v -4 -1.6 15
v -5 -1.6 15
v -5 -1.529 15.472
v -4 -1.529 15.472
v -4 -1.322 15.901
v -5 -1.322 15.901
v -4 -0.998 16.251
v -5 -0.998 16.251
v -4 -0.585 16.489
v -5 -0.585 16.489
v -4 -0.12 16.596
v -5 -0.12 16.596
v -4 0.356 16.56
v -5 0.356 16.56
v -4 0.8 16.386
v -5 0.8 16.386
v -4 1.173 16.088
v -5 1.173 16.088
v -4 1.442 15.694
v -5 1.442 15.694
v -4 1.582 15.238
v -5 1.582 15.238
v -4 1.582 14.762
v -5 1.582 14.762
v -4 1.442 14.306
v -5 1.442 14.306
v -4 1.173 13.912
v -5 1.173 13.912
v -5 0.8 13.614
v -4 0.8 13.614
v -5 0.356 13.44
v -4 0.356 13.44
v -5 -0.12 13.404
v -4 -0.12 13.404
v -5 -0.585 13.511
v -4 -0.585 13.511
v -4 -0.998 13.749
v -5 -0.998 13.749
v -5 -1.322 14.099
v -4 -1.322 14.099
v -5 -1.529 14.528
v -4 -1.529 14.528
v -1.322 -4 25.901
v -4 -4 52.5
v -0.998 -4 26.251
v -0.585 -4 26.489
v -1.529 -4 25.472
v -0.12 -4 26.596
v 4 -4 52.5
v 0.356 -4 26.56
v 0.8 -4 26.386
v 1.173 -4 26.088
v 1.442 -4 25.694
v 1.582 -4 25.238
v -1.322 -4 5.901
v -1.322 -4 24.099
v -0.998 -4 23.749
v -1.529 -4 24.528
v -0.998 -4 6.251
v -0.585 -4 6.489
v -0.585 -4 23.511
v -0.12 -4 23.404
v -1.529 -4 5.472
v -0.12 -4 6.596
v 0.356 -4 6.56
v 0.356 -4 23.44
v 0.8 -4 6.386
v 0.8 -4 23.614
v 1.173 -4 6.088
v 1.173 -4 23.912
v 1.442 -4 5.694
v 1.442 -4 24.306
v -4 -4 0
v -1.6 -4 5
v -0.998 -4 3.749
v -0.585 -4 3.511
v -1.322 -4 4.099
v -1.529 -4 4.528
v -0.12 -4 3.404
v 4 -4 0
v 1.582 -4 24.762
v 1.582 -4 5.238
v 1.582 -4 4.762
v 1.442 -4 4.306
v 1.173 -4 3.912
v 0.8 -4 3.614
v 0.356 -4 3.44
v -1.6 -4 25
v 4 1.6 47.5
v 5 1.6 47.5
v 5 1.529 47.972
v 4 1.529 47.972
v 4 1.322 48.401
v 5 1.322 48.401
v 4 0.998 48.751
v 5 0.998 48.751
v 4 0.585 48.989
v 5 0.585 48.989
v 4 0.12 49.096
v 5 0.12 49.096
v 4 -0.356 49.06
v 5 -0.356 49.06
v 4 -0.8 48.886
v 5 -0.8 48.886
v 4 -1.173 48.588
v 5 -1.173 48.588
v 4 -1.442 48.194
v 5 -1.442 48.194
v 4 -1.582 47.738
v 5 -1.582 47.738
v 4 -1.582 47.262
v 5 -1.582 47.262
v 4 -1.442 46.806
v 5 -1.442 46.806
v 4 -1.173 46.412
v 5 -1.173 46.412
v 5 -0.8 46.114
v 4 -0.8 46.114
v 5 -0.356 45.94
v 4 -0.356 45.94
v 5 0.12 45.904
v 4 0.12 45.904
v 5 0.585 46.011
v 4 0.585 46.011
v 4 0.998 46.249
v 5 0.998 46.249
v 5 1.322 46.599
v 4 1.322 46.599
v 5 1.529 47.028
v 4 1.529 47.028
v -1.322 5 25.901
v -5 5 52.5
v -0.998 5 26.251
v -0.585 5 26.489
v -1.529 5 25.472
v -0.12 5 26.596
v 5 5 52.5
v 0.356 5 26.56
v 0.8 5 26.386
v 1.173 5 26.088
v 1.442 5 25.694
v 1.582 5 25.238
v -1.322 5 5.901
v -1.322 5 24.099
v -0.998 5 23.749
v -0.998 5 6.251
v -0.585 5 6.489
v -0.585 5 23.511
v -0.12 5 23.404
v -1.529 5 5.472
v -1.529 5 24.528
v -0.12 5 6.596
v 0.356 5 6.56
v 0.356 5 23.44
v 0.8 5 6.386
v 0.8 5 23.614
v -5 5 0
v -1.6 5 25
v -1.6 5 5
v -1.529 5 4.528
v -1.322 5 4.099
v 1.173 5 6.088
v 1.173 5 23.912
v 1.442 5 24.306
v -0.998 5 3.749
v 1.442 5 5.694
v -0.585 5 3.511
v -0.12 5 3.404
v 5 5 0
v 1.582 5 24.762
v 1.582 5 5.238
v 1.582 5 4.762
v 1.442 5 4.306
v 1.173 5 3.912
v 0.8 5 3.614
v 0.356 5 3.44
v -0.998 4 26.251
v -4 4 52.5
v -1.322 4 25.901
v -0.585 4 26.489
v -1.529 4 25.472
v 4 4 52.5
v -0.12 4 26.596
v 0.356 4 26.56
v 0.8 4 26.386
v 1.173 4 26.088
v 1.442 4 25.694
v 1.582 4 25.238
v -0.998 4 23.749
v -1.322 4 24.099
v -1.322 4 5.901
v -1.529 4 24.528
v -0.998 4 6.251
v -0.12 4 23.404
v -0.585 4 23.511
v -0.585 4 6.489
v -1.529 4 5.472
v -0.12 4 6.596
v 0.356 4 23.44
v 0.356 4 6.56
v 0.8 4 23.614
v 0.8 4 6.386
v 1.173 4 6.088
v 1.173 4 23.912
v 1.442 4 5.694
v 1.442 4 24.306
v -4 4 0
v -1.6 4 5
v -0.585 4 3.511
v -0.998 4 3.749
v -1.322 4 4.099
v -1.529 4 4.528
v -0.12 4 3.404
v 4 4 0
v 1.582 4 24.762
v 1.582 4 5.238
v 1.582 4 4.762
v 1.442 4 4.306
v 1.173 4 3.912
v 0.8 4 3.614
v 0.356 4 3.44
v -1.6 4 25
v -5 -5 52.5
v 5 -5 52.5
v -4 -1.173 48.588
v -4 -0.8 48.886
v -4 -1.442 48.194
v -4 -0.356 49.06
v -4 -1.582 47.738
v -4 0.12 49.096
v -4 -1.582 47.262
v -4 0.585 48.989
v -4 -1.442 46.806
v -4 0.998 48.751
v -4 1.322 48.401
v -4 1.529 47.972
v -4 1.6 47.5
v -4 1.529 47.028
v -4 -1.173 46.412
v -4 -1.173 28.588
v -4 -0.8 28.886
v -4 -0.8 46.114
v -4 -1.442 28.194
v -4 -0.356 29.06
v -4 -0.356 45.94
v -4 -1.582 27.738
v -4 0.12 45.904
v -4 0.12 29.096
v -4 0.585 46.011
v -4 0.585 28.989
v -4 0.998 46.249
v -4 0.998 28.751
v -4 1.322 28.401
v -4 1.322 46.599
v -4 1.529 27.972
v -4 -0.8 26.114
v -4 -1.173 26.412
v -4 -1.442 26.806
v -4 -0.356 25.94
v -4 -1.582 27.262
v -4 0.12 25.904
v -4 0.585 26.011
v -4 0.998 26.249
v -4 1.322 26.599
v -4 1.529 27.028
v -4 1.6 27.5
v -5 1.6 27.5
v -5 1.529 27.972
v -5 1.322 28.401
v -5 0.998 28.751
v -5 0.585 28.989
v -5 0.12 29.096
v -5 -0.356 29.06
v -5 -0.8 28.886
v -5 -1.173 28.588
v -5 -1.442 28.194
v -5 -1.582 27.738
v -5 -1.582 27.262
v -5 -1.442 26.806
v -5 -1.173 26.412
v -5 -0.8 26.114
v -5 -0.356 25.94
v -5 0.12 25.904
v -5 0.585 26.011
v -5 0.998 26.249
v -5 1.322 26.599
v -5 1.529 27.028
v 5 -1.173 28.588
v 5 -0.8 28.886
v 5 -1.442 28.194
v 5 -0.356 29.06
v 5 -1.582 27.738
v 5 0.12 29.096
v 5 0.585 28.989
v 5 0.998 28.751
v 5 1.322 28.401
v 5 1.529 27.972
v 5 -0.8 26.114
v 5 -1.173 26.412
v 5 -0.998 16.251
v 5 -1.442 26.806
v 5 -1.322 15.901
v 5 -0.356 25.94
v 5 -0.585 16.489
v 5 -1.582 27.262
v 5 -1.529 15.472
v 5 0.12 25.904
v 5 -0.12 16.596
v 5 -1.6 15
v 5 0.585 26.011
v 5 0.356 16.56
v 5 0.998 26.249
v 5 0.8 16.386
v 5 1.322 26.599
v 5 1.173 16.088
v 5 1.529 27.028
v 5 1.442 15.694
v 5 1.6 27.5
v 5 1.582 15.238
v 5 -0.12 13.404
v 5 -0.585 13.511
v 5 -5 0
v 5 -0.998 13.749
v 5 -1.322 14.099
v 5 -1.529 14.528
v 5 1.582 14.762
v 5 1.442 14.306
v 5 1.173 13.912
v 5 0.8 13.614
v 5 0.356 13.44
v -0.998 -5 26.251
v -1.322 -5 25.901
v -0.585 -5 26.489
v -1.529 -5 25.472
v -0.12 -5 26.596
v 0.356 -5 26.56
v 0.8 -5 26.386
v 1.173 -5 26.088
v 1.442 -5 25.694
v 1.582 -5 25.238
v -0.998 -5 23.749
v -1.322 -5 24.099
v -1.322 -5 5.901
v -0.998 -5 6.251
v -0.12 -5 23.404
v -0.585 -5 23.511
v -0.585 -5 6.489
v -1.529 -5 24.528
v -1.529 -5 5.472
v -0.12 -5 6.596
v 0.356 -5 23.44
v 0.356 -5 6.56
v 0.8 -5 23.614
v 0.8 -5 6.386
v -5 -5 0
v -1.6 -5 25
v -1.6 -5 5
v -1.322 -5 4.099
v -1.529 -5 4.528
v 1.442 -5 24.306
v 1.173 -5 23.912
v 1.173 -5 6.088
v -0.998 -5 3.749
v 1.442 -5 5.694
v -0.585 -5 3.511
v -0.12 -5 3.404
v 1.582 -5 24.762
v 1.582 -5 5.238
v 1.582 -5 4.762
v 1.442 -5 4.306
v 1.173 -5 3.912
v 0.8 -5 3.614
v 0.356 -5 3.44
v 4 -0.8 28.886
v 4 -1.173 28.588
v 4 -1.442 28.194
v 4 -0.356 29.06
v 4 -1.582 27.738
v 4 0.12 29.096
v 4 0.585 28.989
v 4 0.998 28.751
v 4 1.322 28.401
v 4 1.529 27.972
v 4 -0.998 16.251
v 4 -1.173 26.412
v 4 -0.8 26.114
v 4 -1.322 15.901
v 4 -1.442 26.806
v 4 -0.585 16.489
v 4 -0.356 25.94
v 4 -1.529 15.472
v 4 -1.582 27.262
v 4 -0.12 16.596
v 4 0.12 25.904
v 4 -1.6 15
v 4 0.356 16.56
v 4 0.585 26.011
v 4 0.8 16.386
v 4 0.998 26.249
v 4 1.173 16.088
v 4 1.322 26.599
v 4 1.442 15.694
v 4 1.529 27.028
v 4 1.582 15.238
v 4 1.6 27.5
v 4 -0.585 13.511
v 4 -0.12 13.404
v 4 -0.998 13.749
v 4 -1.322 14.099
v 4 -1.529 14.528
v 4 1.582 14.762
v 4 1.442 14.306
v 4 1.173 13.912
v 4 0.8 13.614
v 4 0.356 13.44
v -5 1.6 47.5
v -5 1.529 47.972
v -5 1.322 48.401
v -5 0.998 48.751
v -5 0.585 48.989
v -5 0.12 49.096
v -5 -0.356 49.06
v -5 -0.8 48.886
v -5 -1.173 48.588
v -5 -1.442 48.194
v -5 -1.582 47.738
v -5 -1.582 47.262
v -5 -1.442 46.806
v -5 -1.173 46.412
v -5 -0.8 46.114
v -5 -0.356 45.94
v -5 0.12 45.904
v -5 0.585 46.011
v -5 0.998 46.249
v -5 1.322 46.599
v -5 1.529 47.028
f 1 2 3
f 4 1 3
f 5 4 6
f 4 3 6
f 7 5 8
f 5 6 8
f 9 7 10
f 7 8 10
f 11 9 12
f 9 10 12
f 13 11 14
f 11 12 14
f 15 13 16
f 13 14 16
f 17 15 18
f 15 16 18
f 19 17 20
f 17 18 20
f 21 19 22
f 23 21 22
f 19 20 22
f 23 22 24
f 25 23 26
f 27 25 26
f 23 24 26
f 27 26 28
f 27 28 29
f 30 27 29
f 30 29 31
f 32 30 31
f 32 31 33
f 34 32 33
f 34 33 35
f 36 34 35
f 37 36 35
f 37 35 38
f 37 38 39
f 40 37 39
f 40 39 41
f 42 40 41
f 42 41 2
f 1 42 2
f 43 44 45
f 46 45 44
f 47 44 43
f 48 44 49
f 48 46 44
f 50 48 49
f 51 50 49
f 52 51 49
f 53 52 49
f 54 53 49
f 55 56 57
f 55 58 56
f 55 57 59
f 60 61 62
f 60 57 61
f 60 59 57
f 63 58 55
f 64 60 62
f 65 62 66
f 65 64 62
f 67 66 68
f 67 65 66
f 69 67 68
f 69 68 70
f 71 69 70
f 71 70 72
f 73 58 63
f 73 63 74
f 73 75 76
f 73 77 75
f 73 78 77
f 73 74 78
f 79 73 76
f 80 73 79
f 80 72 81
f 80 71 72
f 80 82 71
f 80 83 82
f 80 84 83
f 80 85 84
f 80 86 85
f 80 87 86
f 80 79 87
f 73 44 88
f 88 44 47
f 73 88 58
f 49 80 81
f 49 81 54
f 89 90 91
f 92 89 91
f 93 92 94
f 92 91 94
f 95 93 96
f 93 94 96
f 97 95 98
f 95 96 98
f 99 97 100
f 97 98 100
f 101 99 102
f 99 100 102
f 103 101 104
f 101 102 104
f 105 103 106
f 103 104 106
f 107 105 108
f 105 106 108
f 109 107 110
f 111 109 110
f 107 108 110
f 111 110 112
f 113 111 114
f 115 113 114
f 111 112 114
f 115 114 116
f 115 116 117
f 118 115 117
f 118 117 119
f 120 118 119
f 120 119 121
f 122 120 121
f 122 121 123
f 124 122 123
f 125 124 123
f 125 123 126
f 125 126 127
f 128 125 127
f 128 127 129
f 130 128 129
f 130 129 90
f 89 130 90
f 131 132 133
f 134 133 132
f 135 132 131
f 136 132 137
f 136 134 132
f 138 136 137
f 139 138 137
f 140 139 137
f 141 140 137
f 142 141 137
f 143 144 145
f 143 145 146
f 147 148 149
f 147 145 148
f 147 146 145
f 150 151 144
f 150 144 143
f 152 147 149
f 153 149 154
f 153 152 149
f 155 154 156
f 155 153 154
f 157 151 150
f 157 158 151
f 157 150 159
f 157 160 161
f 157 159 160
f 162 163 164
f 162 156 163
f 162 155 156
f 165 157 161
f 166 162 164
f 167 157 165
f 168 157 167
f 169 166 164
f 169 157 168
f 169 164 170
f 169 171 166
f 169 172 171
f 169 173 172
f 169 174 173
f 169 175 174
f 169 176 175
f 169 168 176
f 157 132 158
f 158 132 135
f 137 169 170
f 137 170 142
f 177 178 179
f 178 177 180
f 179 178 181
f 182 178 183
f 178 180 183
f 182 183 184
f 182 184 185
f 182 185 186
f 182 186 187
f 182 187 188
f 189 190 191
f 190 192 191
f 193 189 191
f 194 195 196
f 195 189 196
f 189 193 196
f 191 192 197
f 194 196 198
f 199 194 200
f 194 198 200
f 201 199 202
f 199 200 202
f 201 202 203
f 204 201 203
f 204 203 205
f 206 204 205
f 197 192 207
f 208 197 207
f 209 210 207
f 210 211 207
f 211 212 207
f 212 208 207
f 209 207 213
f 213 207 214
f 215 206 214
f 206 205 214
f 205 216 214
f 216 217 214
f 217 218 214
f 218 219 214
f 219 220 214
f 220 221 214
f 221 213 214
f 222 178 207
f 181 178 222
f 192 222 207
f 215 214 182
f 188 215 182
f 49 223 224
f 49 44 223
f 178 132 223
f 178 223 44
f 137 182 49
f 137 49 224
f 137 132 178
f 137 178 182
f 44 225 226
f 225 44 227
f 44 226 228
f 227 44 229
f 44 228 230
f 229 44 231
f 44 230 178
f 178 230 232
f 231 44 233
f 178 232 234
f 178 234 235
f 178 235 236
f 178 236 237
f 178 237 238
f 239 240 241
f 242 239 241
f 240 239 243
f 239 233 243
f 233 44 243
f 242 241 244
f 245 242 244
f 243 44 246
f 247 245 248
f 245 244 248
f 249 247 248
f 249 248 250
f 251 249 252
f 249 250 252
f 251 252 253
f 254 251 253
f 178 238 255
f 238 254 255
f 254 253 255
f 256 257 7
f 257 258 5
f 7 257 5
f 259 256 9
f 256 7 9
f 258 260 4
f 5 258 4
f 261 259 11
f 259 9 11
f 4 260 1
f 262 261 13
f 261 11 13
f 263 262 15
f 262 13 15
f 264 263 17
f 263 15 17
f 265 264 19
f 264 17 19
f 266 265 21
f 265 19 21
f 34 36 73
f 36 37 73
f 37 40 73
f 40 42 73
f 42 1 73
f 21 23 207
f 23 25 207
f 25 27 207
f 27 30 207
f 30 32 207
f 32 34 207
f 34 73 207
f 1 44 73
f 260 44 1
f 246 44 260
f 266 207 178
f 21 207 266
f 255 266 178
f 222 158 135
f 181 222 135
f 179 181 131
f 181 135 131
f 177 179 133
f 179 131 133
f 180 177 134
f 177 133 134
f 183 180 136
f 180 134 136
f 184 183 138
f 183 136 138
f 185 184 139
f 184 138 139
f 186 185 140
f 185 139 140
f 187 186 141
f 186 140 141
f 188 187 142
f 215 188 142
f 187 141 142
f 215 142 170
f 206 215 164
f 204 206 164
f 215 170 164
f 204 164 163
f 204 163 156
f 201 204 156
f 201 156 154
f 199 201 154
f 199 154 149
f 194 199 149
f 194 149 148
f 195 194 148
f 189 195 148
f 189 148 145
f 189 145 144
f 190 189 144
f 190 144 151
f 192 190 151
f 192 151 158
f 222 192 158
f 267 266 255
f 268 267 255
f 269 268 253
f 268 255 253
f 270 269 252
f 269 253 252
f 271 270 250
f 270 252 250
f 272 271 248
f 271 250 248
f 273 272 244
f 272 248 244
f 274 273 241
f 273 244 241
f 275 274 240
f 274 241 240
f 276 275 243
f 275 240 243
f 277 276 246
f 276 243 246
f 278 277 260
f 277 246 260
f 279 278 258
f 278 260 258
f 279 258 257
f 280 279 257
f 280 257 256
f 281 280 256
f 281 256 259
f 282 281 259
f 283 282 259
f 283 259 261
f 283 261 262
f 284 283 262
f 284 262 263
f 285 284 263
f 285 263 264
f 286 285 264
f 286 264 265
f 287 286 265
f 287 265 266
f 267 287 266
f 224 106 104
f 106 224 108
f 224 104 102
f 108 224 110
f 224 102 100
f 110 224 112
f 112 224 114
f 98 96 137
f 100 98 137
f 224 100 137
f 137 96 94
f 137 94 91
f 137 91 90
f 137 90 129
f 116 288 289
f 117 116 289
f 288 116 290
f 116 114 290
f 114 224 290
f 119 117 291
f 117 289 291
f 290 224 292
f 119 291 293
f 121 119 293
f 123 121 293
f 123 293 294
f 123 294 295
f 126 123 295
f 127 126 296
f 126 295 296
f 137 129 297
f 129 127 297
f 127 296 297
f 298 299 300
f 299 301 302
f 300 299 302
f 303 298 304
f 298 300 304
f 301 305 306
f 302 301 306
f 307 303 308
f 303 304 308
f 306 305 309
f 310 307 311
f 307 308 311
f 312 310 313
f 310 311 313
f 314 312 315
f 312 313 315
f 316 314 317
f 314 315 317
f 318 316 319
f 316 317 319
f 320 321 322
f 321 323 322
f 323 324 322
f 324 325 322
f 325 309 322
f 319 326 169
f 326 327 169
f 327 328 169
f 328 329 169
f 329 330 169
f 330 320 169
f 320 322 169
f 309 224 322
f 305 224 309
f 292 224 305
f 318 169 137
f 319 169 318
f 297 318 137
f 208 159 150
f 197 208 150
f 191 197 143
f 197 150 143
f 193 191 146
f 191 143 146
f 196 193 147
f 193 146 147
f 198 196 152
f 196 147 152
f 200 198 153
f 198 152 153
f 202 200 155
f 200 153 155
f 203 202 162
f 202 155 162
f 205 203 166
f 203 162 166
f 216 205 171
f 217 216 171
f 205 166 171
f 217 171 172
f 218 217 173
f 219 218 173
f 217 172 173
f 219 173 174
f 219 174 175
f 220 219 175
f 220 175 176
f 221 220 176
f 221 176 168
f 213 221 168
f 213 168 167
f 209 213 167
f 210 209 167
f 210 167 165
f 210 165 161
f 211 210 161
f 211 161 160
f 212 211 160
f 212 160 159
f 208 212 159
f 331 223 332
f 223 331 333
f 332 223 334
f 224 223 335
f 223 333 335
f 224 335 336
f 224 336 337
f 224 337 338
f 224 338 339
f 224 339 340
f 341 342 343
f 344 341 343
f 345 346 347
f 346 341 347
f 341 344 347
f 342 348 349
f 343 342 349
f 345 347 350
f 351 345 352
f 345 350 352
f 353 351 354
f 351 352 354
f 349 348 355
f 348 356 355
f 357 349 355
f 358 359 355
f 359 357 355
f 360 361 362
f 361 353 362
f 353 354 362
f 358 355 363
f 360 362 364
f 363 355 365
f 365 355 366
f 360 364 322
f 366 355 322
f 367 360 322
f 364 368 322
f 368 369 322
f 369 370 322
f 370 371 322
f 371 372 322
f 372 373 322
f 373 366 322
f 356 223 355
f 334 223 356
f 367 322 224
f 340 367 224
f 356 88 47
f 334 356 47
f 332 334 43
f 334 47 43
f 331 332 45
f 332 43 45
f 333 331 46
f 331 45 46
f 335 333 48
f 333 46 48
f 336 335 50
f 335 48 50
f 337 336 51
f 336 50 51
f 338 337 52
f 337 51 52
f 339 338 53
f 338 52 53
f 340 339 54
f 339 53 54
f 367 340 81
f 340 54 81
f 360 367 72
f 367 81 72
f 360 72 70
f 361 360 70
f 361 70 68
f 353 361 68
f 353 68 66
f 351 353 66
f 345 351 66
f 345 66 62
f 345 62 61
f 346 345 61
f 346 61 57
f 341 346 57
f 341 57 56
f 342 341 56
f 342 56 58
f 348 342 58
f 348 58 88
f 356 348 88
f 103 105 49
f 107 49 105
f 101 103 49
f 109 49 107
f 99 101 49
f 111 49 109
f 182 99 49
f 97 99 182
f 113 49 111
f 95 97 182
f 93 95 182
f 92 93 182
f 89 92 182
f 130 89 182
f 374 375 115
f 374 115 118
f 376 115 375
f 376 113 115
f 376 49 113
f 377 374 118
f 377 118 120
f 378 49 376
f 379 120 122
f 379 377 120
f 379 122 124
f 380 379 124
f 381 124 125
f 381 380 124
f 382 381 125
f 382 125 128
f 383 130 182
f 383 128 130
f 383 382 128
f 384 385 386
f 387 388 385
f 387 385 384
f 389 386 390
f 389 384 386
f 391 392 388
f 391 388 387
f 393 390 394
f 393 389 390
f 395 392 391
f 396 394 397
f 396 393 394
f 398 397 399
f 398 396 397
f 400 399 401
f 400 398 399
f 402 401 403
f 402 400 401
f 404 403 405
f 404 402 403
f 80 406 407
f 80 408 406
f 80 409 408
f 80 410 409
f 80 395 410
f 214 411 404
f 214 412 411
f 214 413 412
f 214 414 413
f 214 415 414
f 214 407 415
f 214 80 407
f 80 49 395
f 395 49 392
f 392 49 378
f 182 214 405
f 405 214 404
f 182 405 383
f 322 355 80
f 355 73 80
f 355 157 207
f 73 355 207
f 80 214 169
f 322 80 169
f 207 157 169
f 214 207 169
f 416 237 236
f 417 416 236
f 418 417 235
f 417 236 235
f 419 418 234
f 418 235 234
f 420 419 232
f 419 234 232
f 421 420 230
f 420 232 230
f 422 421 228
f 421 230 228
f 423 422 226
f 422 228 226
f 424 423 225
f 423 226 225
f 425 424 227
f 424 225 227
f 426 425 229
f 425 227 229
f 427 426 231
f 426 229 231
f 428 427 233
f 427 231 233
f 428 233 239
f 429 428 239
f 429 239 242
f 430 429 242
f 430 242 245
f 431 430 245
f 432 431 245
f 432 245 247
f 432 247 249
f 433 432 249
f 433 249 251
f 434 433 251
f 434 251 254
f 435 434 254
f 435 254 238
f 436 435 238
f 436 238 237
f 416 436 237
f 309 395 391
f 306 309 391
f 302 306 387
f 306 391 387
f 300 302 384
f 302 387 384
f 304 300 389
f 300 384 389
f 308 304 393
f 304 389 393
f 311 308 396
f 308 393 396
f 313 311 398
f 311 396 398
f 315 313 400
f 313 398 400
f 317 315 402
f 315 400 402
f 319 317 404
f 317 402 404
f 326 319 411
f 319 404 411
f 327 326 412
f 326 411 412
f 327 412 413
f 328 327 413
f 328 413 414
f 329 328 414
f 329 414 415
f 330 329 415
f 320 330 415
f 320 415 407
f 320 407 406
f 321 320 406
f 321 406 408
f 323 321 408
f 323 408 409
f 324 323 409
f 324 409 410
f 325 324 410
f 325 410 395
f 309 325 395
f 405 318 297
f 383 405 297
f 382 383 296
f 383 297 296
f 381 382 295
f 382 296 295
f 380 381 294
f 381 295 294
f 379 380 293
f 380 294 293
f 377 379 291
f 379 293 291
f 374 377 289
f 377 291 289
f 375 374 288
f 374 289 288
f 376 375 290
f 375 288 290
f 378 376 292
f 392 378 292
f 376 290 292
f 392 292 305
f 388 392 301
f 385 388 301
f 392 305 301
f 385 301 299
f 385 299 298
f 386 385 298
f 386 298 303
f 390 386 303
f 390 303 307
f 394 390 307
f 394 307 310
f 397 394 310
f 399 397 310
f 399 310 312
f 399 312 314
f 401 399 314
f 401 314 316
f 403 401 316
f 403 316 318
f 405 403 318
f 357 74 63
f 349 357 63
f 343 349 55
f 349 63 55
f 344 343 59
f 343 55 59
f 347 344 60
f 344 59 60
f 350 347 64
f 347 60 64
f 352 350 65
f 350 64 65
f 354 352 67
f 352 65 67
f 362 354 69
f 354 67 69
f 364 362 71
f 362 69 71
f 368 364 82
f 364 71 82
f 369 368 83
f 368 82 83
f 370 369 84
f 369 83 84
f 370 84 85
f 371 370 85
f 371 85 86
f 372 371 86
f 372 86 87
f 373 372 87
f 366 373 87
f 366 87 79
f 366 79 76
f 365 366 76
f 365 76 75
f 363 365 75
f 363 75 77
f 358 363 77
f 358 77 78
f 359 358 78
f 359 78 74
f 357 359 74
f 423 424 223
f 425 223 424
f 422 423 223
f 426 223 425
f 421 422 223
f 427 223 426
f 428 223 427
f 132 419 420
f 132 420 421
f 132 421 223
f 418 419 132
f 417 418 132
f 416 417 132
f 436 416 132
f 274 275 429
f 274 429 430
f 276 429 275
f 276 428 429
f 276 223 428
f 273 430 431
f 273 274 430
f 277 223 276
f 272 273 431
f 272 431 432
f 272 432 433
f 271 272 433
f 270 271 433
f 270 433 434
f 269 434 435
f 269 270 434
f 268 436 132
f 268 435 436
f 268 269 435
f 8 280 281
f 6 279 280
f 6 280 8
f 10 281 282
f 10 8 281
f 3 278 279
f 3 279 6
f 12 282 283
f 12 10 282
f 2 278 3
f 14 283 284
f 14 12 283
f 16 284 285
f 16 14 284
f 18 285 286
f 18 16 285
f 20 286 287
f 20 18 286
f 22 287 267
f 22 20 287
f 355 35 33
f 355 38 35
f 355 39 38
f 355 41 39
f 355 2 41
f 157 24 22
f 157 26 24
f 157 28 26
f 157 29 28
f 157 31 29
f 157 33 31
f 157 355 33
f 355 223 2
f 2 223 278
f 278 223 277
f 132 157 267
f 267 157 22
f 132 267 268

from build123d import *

# Parameters (mm, degrees)
SKETCH_1_W          = 10
SKETCH_1_H          = 10
SKETCH_1_W_2        = 8
SKETCH_1_H_2        = 8
EXTRUDE_1_DEPTH     = 52.5
SKETCH_2_R          = 1.6
CUT_EXTRUDE_1_DEPTH = 54.677276384
SKETCH_3_R          = 1.6
CUT_EXTRUDE_2_DEPTH = 54.677276384
SKETCH_4_R          = 1.6
CUT_EXTRUDE_3_DEPTH = 54.677276384


with BuildPart() as part:
    # ｽｹｯﾁ1 → 押し出し-薄板1 (new body)
    with BuildSketch(Plane.XY):
        Rectangle(SKETCH_1_W, SKETCH_1_H)
        Rectangle(SKETCH_1_W_2, SKETCH_1_H_2, mode=Mode.SUBTRACT)
    extrude(amount=EXTRUDE_1_DEPTH)

    # ｽｹｯﾁ2 → ｶｯﾄ - 押し出し1 (cut, through all)
    with BuildSketch(Plane(origin=(0, 5, 0), x_dir=(1, 0, 0), z_dir=(0, 1, 0))):
        with Locations(Location((0, -5, 0), (0, 0, 180))):
            Circle(SKETCH_2_R)
        with Locations(Location((0, -25, 0), (0, 0, 180))):
            Circle(SKETCH_2_R)
    extrude(amount=-CUT_EXTRUDE_1_DEPTH, mode=Mode.SUBTRACT)

    # ｽｹｯﾁ3 → ｶｯﾄ - 押し出し2 (cut, through all)
    with BuildSketch(Plane(origin=(5, 0, 0), x_dir=(0, 0, -1), z_dir=(1, 0, 0))):
        with Locations(Location((-47.5, 0, 0), (0, 0, 90))):
            Circle(SKETCH_3_R)
        with Locations(Location((-27.5, 0, 0), (0, 0, 90))):
            Circle(SKETCH_3_R)
    extrude(amount=-CUT_EXTRUDE_2_DEPTH, mode=Mode.SUBTRACT)

    # ｽｹｯﾁ4 → ｶｯﾄ - 押し出し3 (cut, through all)
    with BuildSketch(Plane.ZY.offset(5)):
        with Locations(Location((15, 0, 0), (0, 0, 270))):
            Circle(SKETCH_4_R)
    extrude(amount=-CUT_EXTRUDE_3_DEPTH, mode=Mode.SUBTRACT)


solid = part.part
